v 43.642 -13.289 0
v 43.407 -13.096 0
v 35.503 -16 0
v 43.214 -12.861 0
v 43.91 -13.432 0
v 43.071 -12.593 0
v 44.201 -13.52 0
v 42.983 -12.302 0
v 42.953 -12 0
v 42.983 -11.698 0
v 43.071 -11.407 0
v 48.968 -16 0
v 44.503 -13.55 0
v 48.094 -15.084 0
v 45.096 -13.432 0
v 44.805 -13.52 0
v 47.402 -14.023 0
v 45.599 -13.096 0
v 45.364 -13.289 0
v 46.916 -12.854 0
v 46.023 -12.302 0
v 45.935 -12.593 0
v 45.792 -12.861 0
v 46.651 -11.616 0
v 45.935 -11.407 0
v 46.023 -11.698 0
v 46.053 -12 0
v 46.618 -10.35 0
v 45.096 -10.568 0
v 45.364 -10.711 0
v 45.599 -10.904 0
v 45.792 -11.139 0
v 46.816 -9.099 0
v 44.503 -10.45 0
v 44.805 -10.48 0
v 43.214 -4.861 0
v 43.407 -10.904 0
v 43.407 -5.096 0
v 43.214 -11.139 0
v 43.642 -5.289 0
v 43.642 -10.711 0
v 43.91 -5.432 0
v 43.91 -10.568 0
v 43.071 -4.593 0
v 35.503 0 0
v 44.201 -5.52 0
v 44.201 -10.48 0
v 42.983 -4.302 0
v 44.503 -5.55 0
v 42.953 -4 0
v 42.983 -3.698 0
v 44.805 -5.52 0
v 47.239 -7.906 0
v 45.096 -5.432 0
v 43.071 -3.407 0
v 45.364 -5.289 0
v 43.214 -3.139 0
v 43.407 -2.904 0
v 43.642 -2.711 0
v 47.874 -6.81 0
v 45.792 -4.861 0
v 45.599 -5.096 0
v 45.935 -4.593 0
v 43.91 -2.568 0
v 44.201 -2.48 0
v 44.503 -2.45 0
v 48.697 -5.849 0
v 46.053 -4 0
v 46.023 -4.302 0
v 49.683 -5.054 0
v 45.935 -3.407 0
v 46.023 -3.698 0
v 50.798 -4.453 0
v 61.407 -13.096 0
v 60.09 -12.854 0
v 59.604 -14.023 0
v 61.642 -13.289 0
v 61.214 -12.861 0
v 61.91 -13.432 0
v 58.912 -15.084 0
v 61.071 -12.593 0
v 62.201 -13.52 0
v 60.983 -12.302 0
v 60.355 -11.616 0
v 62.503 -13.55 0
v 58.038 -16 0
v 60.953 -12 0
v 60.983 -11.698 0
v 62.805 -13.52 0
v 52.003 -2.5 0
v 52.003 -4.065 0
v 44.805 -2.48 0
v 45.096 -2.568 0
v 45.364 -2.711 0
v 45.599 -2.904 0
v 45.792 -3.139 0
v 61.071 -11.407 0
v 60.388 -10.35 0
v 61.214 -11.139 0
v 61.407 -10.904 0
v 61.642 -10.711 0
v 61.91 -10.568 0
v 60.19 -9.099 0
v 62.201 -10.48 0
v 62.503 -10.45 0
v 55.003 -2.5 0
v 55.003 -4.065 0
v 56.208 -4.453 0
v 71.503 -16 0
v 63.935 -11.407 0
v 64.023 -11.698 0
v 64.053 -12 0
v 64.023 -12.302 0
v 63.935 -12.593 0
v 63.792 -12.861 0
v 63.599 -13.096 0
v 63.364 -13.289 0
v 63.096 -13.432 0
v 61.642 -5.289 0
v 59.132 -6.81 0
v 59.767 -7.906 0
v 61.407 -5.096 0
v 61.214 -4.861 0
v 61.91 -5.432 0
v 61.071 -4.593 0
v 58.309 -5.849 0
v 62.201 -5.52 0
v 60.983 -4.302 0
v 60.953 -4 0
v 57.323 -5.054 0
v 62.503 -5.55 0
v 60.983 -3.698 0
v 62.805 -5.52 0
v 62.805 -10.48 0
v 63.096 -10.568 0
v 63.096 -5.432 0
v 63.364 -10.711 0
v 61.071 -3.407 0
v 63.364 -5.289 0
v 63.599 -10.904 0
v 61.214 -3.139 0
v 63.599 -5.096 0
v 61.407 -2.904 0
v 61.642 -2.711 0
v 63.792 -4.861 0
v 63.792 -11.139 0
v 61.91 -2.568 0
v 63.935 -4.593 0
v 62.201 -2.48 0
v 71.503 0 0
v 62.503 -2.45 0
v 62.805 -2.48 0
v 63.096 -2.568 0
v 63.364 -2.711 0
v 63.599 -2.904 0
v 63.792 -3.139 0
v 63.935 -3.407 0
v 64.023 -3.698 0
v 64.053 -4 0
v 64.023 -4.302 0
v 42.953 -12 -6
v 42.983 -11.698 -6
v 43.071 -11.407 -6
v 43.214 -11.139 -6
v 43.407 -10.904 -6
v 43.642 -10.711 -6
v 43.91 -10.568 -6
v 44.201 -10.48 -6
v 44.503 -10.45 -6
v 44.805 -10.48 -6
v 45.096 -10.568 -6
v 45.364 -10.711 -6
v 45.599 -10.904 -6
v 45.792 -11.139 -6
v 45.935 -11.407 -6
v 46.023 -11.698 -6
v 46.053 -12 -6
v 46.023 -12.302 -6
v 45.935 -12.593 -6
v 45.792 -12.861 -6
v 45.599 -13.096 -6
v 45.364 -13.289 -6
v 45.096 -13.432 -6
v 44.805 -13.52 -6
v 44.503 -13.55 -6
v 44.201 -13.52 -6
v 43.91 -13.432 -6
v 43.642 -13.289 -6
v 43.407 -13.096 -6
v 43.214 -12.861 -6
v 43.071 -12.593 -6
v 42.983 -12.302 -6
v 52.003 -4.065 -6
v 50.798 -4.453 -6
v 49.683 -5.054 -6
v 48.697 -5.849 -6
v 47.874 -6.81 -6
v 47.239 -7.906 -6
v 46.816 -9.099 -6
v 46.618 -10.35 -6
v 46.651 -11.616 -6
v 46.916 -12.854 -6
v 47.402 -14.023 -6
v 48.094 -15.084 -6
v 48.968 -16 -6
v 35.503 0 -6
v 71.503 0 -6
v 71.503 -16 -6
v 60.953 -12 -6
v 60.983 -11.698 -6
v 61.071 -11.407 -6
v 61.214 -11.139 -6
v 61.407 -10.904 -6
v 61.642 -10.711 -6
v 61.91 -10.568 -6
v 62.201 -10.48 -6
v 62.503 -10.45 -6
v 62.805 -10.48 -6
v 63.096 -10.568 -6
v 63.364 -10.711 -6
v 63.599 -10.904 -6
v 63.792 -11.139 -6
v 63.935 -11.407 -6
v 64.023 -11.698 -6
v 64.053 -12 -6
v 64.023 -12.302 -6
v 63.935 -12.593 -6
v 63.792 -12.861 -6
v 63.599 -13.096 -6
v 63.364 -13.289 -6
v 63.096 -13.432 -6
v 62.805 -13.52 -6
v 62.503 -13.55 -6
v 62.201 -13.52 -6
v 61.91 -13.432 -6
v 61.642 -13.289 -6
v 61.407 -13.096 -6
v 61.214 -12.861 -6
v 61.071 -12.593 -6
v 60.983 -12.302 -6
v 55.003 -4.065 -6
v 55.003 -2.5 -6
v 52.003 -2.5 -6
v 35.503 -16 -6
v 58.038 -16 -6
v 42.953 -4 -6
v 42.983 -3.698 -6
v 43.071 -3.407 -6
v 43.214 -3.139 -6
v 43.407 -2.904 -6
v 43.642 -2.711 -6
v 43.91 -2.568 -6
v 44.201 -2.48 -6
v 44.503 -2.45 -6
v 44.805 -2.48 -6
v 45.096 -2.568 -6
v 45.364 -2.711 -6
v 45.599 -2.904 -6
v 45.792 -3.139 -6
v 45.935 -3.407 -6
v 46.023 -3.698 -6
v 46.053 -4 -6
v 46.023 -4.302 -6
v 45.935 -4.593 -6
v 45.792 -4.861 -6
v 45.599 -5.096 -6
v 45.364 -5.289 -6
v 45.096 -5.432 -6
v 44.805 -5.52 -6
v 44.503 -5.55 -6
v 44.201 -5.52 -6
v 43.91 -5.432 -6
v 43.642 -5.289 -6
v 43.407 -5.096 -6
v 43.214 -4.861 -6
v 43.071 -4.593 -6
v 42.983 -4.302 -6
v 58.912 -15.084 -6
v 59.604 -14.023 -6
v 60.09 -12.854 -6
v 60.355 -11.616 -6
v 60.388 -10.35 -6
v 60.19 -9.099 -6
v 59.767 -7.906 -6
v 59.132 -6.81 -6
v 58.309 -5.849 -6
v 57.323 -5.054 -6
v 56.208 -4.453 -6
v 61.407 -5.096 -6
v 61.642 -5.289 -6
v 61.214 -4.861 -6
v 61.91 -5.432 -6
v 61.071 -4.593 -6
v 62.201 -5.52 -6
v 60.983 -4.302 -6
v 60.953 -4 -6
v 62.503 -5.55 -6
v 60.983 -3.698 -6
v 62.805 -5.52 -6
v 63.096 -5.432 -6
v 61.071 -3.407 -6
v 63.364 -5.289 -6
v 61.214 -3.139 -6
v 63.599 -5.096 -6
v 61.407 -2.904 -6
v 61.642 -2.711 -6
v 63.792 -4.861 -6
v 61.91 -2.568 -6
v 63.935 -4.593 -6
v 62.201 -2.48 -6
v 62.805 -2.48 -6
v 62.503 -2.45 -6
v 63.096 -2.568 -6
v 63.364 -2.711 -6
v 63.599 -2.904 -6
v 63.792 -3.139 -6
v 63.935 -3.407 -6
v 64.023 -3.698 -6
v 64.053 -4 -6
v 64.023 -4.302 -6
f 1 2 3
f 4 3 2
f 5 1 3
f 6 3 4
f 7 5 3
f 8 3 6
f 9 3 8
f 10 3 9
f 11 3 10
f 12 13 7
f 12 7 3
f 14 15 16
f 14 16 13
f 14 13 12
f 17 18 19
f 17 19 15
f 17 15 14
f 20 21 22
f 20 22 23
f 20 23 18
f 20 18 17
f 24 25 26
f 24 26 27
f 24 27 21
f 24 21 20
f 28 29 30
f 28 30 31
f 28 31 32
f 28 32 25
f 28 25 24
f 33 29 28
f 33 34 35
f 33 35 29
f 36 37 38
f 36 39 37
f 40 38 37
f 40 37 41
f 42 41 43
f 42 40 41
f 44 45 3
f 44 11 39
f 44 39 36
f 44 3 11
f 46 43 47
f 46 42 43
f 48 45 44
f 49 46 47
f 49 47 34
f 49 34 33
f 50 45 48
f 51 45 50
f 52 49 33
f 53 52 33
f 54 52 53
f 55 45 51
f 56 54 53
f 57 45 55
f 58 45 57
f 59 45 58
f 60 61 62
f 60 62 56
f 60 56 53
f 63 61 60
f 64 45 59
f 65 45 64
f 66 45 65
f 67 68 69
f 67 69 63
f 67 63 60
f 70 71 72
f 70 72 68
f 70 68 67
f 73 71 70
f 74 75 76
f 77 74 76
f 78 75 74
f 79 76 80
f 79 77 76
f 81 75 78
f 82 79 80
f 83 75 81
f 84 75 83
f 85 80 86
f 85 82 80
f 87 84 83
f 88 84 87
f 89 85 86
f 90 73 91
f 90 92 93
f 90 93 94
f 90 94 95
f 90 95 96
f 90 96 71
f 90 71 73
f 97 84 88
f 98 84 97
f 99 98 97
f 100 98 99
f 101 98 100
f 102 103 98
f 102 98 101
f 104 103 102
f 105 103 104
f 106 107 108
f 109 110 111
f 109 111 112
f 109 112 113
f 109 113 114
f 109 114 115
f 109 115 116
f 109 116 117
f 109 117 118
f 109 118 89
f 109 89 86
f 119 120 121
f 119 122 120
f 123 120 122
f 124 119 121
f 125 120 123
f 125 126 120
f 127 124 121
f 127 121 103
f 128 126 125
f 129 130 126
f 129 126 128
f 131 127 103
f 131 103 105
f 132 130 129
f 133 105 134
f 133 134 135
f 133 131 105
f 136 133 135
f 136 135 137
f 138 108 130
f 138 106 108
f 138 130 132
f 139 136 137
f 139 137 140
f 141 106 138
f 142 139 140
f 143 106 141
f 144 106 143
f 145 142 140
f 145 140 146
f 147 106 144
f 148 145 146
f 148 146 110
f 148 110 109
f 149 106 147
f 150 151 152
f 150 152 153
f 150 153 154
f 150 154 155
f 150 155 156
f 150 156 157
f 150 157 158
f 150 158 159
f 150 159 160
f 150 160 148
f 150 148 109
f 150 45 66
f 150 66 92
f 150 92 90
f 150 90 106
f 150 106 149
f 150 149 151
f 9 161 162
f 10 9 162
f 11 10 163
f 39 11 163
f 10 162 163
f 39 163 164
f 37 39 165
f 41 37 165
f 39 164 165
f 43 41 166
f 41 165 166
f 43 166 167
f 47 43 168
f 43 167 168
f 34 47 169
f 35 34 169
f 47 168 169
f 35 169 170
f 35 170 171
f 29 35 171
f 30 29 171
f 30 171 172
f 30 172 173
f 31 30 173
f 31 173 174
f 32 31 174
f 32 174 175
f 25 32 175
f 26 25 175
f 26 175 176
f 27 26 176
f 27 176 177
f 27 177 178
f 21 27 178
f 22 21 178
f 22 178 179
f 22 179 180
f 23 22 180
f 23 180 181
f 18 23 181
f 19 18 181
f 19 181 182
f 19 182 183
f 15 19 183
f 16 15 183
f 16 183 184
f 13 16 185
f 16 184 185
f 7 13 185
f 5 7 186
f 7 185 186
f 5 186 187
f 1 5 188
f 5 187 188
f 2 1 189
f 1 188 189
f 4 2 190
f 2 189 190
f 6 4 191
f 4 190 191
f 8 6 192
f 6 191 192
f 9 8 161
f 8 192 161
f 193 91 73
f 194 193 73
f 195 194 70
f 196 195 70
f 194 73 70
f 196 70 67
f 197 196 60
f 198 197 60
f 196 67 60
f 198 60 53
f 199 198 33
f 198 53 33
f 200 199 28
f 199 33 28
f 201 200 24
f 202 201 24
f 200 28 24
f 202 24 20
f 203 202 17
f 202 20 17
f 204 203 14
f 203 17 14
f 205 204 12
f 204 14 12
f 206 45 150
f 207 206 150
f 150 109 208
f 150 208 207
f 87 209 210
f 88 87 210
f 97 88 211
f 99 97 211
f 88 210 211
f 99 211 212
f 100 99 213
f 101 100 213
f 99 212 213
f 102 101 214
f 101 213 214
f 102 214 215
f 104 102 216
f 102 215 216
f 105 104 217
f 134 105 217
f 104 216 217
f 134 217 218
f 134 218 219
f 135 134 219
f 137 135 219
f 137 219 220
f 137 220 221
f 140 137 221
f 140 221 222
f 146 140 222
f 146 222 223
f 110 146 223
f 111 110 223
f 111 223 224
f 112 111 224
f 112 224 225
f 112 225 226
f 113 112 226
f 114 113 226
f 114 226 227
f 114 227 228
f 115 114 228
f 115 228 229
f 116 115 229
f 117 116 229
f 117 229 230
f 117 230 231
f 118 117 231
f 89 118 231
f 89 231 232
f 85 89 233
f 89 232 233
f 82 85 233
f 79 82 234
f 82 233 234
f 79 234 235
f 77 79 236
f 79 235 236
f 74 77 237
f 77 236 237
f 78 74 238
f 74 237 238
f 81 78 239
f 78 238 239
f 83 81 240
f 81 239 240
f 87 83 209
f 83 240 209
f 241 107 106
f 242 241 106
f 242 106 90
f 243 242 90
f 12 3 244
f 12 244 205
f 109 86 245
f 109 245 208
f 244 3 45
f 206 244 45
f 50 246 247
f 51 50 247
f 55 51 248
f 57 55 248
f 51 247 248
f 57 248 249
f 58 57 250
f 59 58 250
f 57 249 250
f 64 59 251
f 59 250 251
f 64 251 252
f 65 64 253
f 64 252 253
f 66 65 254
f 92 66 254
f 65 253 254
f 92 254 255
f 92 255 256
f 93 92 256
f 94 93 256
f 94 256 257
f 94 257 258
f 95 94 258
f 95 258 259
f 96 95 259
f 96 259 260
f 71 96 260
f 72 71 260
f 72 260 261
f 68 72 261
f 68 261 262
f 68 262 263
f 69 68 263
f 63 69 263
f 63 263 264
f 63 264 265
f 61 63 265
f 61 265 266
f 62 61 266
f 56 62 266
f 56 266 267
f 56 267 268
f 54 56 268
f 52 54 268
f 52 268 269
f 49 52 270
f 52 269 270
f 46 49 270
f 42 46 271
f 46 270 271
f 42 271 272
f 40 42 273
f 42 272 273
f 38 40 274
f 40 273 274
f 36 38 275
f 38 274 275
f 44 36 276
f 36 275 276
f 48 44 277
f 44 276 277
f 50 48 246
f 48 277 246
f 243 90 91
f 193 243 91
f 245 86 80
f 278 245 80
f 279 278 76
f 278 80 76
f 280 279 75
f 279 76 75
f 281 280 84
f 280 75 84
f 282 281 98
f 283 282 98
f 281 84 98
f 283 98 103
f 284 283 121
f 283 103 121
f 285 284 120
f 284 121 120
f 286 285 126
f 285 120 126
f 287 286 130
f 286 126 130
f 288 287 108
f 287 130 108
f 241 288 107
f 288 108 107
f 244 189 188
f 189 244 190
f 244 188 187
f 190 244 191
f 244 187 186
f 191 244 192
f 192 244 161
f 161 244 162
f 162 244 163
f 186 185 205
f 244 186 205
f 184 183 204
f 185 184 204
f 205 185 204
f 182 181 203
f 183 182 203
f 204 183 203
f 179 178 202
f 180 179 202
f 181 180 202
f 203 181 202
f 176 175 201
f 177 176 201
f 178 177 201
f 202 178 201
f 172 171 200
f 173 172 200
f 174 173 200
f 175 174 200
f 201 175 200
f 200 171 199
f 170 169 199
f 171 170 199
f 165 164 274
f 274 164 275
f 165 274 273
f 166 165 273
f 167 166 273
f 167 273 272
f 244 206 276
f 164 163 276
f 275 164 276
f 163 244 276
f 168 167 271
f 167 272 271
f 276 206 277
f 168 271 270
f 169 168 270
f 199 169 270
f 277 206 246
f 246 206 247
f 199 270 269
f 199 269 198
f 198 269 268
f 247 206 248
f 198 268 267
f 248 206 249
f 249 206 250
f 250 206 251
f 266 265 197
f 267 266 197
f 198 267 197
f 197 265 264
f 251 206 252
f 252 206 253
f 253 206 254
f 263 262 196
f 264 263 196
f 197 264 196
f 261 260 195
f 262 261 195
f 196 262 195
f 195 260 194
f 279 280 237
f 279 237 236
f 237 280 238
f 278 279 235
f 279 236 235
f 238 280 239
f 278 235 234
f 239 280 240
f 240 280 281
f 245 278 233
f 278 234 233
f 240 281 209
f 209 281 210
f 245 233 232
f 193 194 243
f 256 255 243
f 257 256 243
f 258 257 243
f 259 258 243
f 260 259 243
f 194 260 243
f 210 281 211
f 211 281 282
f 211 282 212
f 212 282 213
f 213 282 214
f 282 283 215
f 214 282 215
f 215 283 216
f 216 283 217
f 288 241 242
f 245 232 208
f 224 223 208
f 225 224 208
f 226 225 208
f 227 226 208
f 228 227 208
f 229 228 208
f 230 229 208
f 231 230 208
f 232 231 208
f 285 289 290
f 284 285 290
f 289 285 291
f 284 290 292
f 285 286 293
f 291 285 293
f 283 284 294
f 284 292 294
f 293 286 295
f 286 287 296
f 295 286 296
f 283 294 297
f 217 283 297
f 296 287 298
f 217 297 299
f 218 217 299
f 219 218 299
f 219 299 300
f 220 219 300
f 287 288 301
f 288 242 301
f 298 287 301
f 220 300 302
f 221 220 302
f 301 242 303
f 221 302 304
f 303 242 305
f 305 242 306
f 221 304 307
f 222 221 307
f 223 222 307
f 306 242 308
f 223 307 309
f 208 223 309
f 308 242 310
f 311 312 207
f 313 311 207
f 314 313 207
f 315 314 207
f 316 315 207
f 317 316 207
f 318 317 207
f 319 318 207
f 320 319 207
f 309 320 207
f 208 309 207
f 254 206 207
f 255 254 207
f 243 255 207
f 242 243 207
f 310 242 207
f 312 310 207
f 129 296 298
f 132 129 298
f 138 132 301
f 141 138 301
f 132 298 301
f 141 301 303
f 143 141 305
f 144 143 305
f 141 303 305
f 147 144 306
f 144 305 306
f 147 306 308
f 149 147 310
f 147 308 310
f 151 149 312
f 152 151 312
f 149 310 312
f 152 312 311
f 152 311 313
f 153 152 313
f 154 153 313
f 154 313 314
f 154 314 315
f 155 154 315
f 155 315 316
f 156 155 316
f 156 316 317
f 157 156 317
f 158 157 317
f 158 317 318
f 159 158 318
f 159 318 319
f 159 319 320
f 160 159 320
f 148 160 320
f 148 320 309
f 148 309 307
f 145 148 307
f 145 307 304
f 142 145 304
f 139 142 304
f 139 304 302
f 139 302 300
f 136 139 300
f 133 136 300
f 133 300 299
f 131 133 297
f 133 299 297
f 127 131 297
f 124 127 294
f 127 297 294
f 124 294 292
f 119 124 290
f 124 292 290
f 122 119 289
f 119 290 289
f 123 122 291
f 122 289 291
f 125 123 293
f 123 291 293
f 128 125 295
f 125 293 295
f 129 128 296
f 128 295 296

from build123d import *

# Parameters (mm, degrees)
SZKIC1_W                    = 36
SZKIC1_H                    = 16
DODANIE_WYCI_GNI_CIE1_DEPTH = 6
WYTNIJ_WYCI_GNI_CIE1_DEPTH  = 6
SZKIC3_R                    = 1.55
WYTNIJ_WYCI_GNI_CIE2_DEPTH  = 74.51650454


with BuildPart() as part:
    # Szkic1 → Dodanie-wyciągnięcie1 (new body)
    with BuildSketch(Plane.XY):
        with Locations((53.502982034, -8)):
            Rectangle(SZKIC1_W, SZKIC1_H)
    extrude(amount=-DODANIE_WYCI_GNI_CIE1_DEPTH)

    # Szkic2 → Wytnij-wyciągnięcie1 (cut)
    with BuildSketch(Plane.XY):
        with BuildLine():
            Line((55.002982034, -4.065016704), (55.002982034, -2.5))
            Line((55.002982034, -2.5), (52.002982034, -2.5))
            Line((52.002982034, -2.5), (52.002982034, -4.065016704))
            ThreePointArc((52.002982034, -4.065016704), (46.727022487, -9.497551457), (49.612982034, -16.498938498))
            Line((49.612982034, -16.498938498), (49.612982034, -16))
            Line((49.612982034, -16), (57.392982034, -16))
            Line((57.392982034, -16), (57.392982034, -16.498938498))
            ThreePointArc((57.392982034, -16.498938498), (60.278941582, -9.497551457), (55.002982034, -4.065016704))
        make_face()
    extrude(amount=-WYTNIJ_WYCI_GNI_CIE1_DEPTH, mode=Mode.SUBTRACT)

    # Szkic3 → Wytnij-wyciągnięcie2 (cut, through all)
    with BuildSketch(Plane(origin=(0, 0, -6), x_dir=(-1, 0, 0), z_dir=(0, 0, -1))):
        with Locations((-44.502982035, -12)):
            Circle(SZKIC3_R)
        with Locations((-44.502982035, -4)):
            Circle(SZKIC3_R)
        with Locations((-62.502982035, -4)):
            Circle(SZKIC3_R)
        with Locations((-62.502982035, -12)):
            Circle(SZKIC3_R)
    extrude(amount=-WYTNIJ_WYCI_GNI_CIE2_DEPTH, mode=Mode.SUBTRACT)


solid = part.part
